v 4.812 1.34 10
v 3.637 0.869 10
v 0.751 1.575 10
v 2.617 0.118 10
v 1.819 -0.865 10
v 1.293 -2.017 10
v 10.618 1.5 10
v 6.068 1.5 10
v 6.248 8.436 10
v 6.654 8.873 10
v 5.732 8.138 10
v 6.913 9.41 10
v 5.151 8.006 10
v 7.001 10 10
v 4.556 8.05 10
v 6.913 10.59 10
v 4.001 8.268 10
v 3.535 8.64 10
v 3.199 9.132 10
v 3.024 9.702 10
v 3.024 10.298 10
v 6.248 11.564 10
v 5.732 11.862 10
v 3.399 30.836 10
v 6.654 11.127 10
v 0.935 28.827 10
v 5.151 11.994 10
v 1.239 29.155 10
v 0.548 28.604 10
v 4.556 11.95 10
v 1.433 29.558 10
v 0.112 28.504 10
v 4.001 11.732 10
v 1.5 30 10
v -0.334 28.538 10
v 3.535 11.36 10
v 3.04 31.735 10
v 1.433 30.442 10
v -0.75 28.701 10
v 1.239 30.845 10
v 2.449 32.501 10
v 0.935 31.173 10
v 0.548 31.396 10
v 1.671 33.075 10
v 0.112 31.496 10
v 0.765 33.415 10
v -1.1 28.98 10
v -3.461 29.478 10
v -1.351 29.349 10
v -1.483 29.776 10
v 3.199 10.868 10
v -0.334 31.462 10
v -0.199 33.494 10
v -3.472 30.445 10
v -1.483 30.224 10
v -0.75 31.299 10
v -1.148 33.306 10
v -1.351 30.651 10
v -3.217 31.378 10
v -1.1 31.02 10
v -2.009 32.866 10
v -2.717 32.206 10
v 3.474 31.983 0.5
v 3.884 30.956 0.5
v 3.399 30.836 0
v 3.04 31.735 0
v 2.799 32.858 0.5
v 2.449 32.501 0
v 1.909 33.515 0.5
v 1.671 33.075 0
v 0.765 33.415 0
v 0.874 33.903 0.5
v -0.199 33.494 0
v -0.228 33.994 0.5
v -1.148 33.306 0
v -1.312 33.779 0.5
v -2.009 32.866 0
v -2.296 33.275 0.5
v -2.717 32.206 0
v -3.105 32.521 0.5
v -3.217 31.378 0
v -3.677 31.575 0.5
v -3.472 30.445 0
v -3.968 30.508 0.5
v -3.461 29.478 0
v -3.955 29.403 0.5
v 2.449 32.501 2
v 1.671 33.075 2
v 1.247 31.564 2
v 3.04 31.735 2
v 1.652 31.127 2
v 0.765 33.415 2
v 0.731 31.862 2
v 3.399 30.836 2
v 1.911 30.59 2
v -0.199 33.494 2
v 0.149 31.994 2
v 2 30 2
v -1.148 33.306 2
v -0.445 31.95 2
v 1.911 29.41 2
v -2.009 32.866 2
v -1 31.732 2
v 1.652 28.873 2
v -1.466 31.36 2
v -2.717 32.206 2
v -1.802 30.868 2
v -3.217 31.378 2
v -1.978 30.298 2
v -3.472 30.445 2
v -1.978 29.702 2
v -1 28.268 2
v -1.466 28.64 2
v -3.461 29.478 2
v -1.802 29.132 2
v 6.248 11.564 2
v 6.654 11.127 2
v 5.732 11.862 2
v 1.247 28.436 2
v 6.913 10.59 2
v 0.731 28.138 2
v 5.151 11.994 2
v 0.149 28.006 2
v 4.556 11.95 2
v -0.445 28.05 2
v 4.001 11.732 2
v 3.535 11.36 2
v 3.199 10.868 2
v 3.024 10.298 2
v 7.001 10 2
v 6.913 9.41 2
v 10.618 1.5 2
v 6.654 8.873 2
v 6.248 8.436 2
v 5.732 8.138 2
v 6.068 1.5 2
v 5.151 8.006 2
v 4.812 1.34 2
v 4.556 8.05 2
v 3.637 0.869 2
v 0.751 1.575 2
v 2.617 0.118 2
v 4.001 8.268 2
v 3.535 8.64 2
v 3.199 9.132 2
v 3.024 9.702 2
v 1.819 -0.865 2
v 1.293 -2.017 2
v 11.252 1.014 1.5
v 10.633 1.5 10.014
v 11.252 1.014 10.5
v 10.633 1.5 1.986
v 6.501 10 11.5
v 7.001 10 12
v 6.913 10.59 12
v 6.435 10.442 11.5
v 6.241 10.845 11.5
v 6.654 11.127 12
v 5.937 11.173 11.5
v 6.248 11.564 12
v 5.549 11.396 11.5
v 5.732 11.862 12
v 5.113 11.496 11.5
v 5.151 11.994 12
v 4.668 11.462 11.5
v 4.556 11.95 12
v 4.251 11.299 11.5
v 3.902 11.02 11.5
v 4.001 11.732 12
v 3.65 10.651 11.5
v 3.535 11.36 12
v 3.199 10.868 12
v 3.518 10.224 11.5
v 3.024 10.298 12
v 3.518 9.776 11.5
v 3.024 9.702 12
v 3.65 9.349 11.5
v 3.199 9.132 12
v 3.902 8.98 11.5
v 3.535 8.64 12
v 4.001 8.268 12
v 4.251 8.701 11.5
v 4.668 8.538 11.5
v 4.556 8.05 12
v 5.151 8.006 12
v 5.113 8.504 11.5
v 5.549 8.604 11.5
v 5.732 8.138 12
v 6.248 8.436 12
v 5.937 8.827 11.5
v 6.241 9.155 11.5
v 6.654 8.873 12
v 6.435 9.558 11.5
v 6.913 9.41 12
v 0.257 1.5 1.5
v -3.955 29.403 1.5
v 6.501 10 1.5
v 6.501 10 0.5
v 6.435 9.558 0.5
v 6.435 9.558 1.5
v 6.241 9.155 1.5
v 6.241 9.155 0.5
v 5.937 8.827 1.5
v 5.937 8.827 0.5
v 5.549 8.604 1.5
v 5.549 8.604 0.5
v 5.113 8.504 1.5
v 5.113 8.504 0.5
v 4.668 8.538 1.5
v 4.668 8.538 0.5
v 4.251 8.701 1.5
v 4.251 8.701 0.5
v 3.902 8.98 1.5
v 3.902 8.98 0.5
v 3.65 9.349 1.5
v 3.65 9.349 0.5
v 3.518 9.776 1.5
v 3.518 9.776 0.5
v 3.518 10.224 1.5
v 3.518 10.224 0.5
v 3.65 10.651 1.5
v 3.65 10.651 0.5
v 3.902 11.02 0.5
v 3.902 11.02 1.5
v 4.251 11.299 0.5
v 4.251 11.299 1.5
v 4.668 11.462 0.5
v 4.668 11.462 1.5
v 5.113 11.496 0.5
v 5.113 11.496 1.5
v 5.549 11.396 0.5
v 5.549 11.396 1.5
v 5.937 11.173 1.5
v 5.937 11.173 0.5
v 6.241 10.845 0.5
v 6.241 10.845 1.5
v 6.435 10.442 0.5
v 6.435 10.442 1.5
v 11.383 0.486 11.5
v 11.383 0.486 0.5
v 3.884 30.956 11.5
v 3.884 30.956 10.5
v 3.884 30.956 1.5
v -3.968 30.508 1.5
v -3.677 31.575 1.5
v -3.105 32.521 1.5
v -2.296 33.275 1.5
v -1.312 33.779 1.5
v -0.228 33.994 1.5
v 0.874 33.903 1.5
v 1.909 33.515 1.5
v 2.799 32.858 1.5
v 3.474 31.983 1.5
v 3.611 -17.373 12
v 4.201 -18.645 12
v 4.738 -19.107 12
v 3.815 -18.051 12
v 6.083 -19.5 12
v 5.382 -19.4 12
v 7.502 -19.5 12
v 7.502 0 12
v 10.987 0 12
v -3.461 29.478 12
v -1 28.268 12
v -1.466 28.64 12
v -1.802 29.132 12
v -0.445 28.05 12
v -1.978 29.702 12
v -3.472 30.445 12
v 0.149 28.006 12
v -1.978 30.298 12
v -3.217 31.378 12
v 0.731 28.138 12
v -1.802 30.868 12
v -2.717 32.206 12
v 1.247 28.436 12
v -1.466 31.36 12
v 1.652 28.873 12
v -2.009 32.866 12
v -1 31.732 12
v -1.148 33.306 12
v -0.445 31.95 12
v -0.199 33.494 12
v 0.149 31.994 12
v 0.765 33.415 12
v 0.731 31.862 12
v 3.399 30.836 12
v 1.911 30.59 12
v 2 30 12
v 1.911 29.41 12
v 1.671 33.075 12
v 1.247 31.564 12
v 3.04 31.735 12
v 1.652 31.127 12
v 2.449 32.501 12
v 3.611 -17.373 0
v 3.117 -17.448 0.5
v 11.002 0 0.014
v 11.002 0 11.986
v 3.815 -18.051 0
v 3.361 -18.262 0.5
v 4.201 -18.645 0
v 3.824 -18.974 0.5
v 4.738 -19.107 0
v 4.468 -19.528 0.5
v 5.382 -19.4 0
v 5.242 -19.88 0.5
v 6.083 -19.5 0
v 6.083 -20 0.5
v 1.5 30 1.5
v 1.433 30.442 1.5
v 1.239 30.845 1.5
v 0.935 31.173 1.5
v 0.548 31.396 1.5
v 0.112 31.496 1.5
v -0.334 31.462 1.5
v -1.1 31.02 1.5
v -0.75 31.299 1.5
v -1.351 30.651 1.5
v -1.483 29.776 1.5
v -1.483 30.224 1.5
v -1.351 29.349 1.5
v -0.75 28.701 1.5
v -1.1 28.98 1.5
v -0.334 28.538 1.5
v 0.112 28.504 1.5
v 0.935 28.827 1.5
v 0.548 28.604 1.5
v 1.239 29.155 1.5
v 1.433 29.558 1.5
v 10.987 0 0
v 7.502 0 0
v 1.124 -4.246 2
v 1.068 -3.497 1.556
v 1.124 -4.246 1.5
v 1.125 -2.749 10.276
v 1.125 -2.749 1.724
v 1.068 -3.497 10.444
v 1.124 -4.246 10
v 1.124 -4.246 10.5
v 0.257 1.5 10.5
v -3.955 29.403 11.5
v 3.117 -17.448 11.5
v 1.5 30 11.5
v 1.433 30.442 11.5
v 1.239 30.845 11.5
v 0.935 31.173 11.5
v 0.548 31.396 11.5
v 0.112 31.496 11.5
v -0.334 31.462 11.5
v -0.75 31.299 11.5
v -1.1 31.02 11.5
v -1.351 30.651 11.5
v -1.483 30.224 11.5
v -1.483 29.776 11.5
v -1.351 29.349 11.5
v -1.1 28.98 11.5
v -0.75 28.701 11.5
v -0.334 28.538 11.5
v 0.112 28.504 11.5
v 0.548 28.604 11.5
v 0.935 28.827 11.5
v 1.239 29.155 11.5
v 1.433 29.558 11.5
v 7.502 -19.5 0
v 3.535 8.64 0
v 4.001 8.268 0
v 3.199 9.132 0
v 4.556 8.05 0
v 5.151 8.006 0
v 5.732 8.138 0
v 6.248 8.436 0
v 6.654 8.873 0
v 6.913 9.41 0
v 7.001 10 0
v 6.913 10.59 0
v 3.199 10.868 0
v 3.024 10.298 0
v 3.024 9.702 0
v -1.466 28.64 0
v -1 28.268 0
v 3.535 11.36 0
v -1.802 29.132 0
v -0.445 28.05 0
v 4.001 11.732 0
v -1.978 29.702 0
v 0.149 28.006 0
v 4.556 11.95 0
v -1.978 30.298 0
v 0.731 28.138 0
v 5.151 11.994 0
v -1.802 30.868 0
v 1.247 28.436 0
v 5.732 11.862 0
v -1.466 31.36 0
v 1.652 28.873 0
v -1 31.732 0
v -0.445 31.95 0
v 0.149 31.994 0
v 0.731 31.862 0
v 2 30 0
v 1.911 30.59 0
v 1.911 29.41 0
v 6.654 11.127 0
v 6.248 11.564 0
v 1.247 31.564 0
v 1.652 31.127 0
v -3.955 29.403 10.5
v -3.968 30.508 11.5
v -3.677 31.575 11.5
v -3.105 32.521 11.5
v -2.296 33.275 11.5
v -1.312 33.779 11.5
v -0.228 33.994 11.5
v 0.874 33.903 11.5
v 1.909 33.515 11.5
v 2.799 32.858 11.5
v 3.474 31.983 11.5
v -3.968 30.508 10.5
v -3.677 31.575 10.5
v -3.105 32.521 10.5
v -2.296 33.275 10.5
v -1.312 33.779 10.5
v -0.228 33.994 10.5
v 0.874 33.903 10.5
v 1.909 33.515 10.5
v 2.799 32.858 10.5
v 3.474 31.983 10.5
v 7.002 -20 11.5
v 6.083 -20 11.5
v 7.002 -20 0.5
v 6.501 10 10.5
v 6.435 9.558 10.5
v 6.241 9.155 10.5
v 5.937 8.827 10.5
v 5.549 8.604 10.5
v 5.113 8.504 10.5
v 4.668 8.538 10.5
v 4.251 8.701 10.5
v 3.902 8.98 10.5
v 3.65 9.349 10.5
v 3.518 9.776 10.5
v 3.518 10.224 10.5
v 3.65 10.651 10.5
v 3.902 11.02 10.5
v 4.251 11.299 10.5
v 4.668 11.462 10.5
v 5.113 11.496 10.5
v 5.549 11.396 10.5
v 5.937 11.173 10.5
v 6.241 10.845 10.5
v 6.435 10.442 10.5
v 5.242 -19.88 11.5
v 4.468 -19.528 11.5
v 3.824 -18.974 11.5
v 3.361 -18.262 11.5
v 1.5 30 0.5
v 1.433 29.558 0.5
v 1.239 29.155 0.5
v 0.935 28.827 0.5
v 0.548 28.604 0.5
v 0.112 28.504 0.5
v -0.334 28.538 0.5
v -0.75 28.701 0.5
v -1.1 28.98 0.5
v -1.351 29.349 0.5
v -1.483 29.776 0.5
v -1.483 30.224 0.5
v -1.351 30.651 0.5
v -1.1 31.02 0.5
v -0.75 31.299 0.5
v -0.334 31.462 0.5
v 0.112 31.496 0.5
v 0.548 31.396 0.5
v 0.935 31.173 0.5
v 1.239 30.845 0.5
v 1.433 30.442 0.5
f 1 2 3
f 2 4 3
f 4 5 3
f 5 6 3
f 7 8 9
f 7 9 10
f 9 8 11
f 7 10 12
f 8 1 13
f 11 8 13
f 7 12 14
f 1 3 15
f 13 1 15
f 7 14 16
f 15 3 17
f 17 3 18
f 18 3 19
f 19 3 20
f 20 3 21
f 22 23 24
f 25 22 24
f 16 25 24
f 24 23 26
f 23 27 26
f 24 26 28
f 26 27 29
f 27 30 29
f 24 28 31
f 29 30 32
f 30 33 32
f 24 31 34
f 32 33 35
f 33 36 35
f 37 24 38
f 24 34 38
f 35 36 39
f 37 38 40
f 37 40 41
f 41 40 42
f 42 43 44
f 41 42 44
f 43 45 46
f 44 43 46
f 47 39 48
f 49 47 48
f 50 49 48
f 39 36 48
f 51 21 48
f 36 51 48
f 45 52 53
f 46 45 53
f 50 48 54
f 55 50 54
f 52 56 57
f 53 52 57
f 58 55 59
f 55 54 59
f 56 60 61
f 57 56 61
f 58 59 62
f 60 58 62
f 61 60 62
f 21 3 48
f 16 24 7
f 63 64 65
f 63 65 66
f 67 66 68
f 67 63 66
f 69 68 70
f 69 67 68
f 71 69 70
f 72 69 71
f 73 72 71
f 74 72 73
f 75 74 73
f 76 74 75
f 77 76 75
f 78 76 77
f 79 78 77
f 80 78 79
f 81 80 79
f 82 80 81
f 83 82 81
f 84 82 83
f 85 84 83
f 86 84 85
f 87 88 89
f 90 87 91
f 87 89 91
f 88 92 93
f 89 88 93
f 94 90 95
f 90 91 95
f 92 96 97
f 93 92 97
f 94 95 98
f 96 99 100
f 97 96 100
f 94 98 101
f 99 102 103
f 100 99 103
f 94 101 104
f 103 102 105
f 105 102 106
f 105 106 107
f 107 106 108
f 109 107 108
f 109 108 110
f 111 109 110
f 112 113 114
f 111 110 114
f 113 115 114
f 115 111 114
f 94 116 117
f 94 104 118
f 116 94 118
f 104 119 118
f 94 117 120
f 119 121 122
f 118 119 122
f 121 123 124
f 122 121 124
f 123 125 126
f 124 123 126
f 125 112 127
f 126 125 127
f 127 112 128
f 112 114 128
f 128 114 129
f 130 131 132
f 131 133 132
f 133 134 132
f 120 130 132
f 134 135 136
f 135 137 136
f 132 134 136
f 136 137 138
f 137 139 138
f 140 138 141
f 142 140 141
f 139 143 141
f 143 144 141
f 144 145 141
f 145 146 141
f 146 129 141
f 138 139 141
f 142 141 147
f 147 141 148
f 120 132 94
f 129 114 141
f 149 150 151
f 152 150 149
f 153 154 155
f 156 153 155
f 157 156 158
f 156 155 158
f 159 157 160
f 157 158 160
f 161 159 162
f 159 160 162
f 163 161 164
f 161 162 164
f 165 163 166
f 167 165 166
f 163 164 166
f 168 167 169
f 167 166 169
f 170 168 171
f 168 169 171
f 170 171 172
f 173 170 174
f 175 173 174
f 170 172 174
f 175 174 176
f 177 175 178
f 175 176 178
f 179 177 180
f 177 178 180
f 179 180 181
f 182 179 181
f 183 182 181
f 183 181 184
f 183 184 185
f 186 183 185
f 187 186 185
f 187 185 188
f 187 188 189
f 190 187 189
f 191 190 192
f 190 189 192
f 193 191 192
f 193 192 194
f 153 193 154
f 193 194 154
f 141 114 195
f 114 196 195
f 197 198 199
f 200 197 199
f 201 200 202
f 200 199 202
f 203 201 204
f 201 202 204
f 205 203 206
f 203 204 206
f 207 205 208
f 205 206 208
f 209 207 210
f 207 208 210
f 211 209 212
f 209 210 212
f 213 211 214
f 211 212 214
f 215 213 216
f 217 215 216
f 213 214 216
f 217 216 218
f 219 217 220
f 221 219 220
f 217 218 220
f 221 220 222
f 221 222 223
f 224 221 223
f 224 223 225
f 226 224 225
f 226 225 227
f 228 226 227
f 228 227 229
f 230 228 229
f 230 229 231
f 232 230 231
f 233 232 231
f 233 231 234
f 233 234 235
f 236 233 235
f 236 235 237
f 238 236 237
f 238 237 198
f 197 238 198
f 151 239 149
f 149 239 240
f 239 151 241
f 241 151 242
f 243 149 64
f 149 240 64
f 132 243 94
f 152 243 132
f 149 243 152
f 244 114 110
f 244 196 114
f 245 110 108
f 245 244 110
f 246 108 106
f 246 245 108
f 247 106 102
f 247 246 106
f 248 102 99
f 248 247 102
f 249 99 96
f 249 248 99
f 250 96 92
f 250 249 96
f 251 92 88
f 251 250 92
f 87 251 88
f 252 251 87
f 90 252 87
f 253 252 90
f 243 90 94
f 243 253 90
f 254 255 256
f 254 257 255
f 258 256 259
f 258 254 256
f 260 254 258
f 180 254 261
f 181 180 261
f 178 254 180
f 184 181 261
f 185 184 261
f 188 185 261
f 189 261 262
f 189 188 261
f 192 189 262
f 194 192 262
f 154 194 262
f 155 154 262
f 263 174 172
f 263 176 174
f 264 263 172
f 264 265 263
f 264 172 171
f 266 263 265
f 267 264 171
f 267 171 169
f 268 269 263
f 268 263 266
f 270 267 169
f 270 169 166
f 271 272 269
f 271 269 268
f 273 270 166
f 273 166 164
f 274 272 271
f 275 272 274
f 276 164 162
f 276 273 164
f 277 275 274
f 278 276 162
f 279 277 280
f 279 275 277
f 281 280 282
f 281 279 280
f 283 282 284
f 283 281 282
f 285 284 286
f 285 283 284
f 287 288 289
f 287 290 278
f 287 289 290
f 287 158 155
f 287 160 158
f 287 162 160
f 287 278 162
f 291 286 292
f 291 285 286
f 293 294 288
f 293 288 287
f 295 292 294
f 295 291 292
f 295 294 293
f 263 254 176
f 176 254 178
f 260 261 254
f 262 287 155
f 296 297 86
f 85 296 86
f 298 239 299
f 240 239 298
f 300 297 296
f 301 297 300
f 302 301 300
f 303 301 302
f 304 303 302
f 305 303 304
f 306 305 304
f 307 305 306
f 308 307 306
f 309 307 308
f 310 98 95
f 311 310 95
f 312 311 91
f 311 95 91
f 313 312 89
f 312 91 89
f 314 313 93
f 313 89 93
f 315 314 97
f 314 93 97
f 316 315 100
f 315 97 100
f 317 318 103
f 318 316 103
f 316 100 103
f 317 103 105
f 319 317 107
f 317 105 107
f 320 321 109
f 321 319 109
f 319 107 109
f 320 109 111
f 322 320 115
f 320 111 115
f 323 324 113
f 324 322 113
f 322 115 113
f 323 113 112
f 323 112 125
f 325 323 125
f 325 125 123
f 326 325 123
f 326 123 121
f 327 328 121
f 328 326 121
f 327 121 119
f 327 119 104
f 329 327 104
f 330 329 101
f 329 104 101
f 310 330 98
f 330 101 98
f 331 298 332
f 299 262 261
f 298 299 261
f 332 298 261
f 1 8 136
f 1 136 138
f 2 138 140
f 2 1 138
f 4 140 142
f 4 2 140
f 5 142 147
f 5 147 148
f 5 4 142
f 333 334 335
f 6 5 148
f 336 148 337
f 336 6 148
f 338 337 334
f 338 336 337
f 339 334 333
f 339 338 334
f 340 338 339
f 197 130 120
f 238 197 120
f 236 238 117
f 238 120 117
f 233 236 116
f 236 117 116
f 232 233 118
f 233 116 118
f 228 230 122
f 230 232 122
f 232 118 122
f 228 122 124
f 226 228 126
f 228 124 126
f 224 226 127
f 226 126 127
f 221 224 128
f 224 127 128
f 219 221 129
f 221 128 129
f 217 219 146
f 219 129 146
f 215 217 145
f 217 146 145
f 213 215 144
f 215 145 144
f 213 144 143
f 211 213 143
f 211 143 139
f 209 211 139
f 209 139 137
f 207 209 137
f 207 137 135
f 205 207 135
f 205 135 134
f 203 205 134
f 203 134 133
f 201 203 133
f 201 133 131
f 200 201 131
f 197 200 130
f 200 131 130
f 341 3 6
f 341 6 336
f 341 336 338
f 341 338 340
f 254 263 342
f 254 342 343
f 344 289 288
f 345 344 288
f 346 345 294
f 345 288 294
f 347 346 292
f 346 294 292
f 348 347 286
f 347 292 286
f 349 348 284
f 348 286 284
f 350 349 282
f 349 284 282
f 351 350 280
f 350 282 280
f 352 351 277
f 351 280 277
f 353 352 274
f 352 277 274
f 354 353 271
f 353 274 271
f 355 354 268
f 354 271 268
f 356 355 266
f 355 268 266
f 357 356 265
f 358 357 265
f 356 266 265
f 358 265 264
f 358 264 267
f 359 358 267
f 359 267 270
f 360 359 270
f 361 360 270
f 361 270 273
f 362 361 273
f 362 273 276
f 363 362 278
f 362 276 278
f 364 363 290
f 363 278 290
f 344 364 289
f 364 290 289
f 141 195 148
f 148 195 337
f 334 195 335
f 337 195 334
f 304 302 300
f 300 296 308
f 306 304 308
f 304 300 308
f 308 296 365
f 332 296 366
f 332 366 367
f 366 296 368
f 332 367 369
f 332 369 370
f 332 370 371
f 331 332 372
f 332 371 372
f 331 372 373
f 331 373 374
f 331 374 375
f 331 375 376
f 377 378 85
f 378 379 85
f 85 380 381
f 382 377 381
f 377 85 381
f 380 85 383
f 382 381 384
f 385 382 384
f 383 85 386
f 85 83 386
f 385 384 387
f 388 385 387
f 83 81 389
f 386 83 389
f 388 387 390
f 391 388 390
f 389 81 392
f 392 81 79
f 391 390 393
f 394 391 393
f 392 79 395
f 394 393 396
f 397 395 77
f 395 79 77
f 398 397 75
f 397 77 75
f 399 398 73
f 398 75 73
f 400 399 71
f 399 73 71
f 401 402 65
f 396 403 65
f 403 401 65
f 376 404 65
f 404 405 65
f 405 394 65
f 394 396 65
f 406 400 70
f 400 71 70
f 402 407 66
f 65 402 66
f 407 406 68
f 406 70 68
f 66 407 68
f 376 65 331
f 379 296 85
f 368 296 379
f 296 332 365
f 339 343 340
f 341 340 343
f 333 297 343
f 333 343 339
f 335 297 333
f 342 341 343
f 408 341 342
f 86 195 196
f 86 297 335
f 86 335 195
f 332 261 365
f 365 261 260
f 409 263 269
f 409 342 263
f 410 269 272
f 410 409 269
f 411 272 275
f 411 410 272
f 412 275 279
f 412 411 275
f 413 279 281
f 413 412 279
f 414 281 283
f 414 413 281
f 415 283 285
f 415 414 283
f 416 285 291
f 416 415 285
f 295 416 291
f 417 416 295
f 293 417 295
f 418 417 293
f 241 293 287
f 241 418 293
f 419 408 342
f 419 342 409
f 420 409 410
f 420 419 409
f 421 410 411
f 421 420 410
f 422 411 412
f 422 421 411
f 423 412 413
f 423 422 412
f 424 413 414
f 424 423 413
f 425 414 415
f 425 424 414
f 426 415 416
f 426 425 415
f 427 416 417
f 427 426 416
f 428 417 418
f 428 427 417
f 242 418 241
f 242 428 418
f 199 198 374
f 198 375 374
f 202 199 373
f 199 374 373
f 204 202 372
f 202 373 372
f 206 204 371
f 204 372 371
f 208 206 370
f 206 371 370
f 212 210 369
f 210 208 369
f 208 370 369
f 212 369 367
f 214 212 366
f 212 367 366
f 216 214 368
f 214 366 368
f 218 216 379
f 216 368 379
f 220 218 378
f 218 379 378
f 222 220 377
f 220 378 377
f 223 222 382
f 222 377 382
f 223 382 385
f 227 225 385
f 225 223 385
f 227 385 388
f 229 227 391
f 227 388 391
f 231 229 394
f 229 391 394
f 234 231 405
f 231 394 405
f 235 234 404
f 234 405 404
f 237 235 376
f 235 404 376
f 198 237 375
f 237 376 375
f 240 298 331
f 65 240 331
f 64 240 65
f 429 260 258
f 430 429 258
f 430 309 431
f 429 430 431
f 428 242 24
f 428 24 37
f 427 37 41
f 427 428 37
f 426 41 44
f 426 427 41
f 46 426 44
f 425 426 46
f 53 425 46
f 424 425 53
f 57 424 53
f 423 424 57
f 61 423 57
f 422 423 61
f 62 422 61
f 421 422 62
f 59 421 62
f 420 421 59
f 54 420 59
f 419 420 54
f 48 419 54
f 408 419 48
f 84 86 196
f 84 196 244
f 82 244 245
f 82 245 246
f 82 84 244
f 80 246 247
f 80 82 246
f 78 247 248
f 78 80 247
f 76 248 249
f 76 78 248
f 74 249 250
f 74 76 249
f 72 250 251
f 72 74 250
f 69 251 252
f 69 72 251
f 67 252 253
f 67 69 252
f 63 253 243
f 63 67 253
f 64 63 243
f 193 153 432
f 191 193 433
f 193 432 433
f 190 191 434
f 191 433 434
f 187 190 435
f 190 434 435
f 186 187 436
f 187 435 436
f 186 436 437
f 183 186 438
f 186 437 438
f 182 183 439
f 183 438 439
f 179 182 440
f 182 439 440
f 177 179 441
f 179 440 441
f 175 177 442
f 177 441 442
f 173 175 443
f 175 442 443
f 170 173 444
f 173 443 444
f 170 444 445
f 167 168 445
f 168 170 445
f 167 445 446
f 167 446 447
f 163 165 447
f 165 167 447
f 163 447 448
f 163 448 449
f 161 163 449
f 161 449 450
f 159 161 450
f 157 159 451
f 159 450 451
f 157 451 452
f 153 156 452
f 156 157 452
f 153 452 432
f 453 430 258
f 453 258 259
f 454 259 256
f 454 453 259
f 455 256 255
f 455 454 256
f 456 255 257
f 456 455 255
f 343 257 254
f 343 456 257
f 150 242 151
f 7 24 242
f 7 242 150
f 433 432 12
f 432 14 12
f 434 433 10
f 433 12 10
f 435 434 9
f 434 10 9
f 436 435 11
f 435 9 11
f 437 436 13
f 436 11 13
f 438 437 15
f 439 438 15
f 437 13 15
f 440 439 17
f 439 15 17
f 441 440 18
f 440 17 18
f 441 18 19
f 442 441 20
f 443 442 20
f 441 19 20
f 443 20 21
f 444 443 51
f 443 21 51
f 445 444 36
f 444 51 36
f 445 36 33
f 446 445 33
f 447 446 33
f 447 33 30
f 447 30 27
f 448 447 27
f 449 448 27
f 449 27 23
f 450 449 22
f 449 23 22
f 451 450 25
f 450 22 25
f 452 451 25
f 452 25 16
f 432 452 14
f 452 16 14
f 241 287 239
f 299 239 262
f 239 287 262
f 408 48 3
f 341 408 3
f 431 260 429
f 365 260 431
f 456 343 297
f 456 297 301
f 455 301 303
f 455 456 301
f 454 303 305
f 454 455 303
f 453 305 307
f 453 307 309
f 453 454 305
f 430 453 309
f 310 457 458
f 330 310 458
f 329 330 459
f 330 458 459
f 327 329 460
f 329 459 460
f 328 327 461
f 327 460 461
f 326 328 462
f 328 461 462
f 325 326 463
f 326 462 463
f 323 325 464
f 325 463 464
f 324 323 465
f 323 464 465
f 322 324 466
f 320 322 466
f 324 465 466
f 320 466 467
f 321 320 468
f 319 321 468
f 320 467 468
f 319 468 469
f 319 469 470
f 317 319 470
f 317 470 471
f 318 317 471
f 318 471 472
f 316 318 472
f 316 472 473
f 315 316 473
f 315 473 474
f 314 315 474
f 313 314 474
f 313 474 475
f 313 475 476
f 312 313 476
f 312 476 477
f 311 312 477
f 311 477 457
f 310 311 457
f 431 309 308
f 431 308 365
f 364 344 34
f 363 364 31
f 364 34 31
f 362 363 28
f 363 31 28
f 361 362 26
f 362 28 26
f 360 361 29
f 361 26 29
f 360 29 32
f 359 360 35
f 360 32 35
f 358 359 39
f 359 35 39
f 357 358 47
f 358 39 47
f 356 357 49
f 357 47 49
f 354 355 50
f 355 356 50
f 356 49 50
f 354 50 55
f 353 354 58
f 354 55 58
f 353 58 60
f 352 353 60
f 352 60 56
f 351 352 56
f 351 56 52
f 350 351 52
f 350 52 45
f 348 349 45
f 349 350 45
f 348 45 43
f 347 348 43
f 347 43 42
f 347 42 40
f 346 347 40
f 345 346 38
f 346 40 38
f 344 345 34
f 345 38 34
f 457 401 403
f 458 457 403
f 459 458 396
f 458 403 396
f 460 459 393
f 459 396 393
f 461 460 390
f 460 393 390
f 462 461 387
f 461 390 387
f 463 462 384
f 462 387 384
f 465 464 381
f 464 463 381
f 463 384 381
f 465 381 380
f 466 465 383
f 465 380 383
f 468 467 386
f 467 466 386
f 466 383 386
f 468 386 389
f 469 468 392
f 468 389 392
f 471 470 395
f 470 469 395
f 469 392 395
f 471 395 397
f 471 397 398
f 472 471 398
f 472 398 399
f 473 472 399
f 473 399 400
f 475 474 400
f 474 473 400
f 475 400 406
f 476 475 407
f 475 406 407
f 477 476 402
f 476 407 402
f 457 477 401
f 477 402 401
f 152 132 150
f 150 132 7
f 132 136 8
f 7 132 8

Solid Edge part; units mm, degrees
sketch "Sketch1" plane through (0, 0, 0) normal (0, 0, 1) x (1, 0, 0)
  line L0 (11.50209, -20) -> (11.50209, 0)
  line L1 (11.50209, 0) -> (3.884116, 30.955848)
  line L2 (3.50209, -20) -> (-3.955194, 29.402971)
  line L3 (3.50209, -20) -> (11.50209, -20)
  arc A0 (-3.955198, 29.403) -> (3.884126, 30.955806) centre (0, 30) cw
  circle A1 centre (5.001393, 10) radius 1.5
  circle A2 centre (0, 30) radius 1.5
extrude "Protrusion1" add sketch "Sketch1" along normal blind 12
sketch "Sketch2" plane through (3.751045, 7, 12) normal (0, 0, 1) x (0, -1, 0)
  line L0 (27, 3.751045) -> (27, 7.751045)
  line L1 (27, 7.751045) -> (7, 7.751045)
  line L2 (7, 7.751045) -> (7, 3.751045)
  line L3 (7, 3.751045) -> (27, 3.751045)
extrude "Cutout1" cut sketch "Sketch2" against normal through all
sketch "Sketch3" plane through (0, 0, 0) normal (1, 0, 0) x (0, 1, 0)
  line L0 (1.5, 10) -> (34, 10)
  line L1 (34, 10) -> (34, 2)
  line L2 (34, 2) -> (1.5, 2)
  line L3 (1.5, 2) -> (1.5, 10)
extrude "Cutout2" cut sketch "Sketch3" along normal through all and the other way through all
fillet "Redondeo_1" radius 5 1 edges at (0.256706, 1.5, 6)
fillet "Redondeo_2" radius 3 1 edges at (3.50209, -20, 6)
chamfer "Chaflán_1" distance 0.5 angle 45 25 edges at (-0.419179, 5.9776, 12) (-0.777251, 33.923758, 12) (7.693103, 15.477924, 12) (11.50209, 0, 6) (7.693103, 15.477924, 0) (-0.777251, 33.923758, 0) (-0.419179, 5.9776, 0) (4.126616, -19.274128, 12) (6.792661, -20, 12) (4.126616, -19.274128, 0) (6.792661, -20, 0) (-1.415548, 12.578343, 10) (-0.777251, 33.923758, 10) (7.508534, 16.227924, 10) (11.132952, 1.5, 6) (7.508534, 16.227924, 2) (-1.415548, 12.578343, 2) (0, 28.5, 2) (5.001393, 8.5, 2) (3.501393, 10, 12) (-1.5, 30, 12) (-1.5, 30, 0) (3.501393, 10, 0) (3.501393, 10, 10) (7.50209, -20, 6)
